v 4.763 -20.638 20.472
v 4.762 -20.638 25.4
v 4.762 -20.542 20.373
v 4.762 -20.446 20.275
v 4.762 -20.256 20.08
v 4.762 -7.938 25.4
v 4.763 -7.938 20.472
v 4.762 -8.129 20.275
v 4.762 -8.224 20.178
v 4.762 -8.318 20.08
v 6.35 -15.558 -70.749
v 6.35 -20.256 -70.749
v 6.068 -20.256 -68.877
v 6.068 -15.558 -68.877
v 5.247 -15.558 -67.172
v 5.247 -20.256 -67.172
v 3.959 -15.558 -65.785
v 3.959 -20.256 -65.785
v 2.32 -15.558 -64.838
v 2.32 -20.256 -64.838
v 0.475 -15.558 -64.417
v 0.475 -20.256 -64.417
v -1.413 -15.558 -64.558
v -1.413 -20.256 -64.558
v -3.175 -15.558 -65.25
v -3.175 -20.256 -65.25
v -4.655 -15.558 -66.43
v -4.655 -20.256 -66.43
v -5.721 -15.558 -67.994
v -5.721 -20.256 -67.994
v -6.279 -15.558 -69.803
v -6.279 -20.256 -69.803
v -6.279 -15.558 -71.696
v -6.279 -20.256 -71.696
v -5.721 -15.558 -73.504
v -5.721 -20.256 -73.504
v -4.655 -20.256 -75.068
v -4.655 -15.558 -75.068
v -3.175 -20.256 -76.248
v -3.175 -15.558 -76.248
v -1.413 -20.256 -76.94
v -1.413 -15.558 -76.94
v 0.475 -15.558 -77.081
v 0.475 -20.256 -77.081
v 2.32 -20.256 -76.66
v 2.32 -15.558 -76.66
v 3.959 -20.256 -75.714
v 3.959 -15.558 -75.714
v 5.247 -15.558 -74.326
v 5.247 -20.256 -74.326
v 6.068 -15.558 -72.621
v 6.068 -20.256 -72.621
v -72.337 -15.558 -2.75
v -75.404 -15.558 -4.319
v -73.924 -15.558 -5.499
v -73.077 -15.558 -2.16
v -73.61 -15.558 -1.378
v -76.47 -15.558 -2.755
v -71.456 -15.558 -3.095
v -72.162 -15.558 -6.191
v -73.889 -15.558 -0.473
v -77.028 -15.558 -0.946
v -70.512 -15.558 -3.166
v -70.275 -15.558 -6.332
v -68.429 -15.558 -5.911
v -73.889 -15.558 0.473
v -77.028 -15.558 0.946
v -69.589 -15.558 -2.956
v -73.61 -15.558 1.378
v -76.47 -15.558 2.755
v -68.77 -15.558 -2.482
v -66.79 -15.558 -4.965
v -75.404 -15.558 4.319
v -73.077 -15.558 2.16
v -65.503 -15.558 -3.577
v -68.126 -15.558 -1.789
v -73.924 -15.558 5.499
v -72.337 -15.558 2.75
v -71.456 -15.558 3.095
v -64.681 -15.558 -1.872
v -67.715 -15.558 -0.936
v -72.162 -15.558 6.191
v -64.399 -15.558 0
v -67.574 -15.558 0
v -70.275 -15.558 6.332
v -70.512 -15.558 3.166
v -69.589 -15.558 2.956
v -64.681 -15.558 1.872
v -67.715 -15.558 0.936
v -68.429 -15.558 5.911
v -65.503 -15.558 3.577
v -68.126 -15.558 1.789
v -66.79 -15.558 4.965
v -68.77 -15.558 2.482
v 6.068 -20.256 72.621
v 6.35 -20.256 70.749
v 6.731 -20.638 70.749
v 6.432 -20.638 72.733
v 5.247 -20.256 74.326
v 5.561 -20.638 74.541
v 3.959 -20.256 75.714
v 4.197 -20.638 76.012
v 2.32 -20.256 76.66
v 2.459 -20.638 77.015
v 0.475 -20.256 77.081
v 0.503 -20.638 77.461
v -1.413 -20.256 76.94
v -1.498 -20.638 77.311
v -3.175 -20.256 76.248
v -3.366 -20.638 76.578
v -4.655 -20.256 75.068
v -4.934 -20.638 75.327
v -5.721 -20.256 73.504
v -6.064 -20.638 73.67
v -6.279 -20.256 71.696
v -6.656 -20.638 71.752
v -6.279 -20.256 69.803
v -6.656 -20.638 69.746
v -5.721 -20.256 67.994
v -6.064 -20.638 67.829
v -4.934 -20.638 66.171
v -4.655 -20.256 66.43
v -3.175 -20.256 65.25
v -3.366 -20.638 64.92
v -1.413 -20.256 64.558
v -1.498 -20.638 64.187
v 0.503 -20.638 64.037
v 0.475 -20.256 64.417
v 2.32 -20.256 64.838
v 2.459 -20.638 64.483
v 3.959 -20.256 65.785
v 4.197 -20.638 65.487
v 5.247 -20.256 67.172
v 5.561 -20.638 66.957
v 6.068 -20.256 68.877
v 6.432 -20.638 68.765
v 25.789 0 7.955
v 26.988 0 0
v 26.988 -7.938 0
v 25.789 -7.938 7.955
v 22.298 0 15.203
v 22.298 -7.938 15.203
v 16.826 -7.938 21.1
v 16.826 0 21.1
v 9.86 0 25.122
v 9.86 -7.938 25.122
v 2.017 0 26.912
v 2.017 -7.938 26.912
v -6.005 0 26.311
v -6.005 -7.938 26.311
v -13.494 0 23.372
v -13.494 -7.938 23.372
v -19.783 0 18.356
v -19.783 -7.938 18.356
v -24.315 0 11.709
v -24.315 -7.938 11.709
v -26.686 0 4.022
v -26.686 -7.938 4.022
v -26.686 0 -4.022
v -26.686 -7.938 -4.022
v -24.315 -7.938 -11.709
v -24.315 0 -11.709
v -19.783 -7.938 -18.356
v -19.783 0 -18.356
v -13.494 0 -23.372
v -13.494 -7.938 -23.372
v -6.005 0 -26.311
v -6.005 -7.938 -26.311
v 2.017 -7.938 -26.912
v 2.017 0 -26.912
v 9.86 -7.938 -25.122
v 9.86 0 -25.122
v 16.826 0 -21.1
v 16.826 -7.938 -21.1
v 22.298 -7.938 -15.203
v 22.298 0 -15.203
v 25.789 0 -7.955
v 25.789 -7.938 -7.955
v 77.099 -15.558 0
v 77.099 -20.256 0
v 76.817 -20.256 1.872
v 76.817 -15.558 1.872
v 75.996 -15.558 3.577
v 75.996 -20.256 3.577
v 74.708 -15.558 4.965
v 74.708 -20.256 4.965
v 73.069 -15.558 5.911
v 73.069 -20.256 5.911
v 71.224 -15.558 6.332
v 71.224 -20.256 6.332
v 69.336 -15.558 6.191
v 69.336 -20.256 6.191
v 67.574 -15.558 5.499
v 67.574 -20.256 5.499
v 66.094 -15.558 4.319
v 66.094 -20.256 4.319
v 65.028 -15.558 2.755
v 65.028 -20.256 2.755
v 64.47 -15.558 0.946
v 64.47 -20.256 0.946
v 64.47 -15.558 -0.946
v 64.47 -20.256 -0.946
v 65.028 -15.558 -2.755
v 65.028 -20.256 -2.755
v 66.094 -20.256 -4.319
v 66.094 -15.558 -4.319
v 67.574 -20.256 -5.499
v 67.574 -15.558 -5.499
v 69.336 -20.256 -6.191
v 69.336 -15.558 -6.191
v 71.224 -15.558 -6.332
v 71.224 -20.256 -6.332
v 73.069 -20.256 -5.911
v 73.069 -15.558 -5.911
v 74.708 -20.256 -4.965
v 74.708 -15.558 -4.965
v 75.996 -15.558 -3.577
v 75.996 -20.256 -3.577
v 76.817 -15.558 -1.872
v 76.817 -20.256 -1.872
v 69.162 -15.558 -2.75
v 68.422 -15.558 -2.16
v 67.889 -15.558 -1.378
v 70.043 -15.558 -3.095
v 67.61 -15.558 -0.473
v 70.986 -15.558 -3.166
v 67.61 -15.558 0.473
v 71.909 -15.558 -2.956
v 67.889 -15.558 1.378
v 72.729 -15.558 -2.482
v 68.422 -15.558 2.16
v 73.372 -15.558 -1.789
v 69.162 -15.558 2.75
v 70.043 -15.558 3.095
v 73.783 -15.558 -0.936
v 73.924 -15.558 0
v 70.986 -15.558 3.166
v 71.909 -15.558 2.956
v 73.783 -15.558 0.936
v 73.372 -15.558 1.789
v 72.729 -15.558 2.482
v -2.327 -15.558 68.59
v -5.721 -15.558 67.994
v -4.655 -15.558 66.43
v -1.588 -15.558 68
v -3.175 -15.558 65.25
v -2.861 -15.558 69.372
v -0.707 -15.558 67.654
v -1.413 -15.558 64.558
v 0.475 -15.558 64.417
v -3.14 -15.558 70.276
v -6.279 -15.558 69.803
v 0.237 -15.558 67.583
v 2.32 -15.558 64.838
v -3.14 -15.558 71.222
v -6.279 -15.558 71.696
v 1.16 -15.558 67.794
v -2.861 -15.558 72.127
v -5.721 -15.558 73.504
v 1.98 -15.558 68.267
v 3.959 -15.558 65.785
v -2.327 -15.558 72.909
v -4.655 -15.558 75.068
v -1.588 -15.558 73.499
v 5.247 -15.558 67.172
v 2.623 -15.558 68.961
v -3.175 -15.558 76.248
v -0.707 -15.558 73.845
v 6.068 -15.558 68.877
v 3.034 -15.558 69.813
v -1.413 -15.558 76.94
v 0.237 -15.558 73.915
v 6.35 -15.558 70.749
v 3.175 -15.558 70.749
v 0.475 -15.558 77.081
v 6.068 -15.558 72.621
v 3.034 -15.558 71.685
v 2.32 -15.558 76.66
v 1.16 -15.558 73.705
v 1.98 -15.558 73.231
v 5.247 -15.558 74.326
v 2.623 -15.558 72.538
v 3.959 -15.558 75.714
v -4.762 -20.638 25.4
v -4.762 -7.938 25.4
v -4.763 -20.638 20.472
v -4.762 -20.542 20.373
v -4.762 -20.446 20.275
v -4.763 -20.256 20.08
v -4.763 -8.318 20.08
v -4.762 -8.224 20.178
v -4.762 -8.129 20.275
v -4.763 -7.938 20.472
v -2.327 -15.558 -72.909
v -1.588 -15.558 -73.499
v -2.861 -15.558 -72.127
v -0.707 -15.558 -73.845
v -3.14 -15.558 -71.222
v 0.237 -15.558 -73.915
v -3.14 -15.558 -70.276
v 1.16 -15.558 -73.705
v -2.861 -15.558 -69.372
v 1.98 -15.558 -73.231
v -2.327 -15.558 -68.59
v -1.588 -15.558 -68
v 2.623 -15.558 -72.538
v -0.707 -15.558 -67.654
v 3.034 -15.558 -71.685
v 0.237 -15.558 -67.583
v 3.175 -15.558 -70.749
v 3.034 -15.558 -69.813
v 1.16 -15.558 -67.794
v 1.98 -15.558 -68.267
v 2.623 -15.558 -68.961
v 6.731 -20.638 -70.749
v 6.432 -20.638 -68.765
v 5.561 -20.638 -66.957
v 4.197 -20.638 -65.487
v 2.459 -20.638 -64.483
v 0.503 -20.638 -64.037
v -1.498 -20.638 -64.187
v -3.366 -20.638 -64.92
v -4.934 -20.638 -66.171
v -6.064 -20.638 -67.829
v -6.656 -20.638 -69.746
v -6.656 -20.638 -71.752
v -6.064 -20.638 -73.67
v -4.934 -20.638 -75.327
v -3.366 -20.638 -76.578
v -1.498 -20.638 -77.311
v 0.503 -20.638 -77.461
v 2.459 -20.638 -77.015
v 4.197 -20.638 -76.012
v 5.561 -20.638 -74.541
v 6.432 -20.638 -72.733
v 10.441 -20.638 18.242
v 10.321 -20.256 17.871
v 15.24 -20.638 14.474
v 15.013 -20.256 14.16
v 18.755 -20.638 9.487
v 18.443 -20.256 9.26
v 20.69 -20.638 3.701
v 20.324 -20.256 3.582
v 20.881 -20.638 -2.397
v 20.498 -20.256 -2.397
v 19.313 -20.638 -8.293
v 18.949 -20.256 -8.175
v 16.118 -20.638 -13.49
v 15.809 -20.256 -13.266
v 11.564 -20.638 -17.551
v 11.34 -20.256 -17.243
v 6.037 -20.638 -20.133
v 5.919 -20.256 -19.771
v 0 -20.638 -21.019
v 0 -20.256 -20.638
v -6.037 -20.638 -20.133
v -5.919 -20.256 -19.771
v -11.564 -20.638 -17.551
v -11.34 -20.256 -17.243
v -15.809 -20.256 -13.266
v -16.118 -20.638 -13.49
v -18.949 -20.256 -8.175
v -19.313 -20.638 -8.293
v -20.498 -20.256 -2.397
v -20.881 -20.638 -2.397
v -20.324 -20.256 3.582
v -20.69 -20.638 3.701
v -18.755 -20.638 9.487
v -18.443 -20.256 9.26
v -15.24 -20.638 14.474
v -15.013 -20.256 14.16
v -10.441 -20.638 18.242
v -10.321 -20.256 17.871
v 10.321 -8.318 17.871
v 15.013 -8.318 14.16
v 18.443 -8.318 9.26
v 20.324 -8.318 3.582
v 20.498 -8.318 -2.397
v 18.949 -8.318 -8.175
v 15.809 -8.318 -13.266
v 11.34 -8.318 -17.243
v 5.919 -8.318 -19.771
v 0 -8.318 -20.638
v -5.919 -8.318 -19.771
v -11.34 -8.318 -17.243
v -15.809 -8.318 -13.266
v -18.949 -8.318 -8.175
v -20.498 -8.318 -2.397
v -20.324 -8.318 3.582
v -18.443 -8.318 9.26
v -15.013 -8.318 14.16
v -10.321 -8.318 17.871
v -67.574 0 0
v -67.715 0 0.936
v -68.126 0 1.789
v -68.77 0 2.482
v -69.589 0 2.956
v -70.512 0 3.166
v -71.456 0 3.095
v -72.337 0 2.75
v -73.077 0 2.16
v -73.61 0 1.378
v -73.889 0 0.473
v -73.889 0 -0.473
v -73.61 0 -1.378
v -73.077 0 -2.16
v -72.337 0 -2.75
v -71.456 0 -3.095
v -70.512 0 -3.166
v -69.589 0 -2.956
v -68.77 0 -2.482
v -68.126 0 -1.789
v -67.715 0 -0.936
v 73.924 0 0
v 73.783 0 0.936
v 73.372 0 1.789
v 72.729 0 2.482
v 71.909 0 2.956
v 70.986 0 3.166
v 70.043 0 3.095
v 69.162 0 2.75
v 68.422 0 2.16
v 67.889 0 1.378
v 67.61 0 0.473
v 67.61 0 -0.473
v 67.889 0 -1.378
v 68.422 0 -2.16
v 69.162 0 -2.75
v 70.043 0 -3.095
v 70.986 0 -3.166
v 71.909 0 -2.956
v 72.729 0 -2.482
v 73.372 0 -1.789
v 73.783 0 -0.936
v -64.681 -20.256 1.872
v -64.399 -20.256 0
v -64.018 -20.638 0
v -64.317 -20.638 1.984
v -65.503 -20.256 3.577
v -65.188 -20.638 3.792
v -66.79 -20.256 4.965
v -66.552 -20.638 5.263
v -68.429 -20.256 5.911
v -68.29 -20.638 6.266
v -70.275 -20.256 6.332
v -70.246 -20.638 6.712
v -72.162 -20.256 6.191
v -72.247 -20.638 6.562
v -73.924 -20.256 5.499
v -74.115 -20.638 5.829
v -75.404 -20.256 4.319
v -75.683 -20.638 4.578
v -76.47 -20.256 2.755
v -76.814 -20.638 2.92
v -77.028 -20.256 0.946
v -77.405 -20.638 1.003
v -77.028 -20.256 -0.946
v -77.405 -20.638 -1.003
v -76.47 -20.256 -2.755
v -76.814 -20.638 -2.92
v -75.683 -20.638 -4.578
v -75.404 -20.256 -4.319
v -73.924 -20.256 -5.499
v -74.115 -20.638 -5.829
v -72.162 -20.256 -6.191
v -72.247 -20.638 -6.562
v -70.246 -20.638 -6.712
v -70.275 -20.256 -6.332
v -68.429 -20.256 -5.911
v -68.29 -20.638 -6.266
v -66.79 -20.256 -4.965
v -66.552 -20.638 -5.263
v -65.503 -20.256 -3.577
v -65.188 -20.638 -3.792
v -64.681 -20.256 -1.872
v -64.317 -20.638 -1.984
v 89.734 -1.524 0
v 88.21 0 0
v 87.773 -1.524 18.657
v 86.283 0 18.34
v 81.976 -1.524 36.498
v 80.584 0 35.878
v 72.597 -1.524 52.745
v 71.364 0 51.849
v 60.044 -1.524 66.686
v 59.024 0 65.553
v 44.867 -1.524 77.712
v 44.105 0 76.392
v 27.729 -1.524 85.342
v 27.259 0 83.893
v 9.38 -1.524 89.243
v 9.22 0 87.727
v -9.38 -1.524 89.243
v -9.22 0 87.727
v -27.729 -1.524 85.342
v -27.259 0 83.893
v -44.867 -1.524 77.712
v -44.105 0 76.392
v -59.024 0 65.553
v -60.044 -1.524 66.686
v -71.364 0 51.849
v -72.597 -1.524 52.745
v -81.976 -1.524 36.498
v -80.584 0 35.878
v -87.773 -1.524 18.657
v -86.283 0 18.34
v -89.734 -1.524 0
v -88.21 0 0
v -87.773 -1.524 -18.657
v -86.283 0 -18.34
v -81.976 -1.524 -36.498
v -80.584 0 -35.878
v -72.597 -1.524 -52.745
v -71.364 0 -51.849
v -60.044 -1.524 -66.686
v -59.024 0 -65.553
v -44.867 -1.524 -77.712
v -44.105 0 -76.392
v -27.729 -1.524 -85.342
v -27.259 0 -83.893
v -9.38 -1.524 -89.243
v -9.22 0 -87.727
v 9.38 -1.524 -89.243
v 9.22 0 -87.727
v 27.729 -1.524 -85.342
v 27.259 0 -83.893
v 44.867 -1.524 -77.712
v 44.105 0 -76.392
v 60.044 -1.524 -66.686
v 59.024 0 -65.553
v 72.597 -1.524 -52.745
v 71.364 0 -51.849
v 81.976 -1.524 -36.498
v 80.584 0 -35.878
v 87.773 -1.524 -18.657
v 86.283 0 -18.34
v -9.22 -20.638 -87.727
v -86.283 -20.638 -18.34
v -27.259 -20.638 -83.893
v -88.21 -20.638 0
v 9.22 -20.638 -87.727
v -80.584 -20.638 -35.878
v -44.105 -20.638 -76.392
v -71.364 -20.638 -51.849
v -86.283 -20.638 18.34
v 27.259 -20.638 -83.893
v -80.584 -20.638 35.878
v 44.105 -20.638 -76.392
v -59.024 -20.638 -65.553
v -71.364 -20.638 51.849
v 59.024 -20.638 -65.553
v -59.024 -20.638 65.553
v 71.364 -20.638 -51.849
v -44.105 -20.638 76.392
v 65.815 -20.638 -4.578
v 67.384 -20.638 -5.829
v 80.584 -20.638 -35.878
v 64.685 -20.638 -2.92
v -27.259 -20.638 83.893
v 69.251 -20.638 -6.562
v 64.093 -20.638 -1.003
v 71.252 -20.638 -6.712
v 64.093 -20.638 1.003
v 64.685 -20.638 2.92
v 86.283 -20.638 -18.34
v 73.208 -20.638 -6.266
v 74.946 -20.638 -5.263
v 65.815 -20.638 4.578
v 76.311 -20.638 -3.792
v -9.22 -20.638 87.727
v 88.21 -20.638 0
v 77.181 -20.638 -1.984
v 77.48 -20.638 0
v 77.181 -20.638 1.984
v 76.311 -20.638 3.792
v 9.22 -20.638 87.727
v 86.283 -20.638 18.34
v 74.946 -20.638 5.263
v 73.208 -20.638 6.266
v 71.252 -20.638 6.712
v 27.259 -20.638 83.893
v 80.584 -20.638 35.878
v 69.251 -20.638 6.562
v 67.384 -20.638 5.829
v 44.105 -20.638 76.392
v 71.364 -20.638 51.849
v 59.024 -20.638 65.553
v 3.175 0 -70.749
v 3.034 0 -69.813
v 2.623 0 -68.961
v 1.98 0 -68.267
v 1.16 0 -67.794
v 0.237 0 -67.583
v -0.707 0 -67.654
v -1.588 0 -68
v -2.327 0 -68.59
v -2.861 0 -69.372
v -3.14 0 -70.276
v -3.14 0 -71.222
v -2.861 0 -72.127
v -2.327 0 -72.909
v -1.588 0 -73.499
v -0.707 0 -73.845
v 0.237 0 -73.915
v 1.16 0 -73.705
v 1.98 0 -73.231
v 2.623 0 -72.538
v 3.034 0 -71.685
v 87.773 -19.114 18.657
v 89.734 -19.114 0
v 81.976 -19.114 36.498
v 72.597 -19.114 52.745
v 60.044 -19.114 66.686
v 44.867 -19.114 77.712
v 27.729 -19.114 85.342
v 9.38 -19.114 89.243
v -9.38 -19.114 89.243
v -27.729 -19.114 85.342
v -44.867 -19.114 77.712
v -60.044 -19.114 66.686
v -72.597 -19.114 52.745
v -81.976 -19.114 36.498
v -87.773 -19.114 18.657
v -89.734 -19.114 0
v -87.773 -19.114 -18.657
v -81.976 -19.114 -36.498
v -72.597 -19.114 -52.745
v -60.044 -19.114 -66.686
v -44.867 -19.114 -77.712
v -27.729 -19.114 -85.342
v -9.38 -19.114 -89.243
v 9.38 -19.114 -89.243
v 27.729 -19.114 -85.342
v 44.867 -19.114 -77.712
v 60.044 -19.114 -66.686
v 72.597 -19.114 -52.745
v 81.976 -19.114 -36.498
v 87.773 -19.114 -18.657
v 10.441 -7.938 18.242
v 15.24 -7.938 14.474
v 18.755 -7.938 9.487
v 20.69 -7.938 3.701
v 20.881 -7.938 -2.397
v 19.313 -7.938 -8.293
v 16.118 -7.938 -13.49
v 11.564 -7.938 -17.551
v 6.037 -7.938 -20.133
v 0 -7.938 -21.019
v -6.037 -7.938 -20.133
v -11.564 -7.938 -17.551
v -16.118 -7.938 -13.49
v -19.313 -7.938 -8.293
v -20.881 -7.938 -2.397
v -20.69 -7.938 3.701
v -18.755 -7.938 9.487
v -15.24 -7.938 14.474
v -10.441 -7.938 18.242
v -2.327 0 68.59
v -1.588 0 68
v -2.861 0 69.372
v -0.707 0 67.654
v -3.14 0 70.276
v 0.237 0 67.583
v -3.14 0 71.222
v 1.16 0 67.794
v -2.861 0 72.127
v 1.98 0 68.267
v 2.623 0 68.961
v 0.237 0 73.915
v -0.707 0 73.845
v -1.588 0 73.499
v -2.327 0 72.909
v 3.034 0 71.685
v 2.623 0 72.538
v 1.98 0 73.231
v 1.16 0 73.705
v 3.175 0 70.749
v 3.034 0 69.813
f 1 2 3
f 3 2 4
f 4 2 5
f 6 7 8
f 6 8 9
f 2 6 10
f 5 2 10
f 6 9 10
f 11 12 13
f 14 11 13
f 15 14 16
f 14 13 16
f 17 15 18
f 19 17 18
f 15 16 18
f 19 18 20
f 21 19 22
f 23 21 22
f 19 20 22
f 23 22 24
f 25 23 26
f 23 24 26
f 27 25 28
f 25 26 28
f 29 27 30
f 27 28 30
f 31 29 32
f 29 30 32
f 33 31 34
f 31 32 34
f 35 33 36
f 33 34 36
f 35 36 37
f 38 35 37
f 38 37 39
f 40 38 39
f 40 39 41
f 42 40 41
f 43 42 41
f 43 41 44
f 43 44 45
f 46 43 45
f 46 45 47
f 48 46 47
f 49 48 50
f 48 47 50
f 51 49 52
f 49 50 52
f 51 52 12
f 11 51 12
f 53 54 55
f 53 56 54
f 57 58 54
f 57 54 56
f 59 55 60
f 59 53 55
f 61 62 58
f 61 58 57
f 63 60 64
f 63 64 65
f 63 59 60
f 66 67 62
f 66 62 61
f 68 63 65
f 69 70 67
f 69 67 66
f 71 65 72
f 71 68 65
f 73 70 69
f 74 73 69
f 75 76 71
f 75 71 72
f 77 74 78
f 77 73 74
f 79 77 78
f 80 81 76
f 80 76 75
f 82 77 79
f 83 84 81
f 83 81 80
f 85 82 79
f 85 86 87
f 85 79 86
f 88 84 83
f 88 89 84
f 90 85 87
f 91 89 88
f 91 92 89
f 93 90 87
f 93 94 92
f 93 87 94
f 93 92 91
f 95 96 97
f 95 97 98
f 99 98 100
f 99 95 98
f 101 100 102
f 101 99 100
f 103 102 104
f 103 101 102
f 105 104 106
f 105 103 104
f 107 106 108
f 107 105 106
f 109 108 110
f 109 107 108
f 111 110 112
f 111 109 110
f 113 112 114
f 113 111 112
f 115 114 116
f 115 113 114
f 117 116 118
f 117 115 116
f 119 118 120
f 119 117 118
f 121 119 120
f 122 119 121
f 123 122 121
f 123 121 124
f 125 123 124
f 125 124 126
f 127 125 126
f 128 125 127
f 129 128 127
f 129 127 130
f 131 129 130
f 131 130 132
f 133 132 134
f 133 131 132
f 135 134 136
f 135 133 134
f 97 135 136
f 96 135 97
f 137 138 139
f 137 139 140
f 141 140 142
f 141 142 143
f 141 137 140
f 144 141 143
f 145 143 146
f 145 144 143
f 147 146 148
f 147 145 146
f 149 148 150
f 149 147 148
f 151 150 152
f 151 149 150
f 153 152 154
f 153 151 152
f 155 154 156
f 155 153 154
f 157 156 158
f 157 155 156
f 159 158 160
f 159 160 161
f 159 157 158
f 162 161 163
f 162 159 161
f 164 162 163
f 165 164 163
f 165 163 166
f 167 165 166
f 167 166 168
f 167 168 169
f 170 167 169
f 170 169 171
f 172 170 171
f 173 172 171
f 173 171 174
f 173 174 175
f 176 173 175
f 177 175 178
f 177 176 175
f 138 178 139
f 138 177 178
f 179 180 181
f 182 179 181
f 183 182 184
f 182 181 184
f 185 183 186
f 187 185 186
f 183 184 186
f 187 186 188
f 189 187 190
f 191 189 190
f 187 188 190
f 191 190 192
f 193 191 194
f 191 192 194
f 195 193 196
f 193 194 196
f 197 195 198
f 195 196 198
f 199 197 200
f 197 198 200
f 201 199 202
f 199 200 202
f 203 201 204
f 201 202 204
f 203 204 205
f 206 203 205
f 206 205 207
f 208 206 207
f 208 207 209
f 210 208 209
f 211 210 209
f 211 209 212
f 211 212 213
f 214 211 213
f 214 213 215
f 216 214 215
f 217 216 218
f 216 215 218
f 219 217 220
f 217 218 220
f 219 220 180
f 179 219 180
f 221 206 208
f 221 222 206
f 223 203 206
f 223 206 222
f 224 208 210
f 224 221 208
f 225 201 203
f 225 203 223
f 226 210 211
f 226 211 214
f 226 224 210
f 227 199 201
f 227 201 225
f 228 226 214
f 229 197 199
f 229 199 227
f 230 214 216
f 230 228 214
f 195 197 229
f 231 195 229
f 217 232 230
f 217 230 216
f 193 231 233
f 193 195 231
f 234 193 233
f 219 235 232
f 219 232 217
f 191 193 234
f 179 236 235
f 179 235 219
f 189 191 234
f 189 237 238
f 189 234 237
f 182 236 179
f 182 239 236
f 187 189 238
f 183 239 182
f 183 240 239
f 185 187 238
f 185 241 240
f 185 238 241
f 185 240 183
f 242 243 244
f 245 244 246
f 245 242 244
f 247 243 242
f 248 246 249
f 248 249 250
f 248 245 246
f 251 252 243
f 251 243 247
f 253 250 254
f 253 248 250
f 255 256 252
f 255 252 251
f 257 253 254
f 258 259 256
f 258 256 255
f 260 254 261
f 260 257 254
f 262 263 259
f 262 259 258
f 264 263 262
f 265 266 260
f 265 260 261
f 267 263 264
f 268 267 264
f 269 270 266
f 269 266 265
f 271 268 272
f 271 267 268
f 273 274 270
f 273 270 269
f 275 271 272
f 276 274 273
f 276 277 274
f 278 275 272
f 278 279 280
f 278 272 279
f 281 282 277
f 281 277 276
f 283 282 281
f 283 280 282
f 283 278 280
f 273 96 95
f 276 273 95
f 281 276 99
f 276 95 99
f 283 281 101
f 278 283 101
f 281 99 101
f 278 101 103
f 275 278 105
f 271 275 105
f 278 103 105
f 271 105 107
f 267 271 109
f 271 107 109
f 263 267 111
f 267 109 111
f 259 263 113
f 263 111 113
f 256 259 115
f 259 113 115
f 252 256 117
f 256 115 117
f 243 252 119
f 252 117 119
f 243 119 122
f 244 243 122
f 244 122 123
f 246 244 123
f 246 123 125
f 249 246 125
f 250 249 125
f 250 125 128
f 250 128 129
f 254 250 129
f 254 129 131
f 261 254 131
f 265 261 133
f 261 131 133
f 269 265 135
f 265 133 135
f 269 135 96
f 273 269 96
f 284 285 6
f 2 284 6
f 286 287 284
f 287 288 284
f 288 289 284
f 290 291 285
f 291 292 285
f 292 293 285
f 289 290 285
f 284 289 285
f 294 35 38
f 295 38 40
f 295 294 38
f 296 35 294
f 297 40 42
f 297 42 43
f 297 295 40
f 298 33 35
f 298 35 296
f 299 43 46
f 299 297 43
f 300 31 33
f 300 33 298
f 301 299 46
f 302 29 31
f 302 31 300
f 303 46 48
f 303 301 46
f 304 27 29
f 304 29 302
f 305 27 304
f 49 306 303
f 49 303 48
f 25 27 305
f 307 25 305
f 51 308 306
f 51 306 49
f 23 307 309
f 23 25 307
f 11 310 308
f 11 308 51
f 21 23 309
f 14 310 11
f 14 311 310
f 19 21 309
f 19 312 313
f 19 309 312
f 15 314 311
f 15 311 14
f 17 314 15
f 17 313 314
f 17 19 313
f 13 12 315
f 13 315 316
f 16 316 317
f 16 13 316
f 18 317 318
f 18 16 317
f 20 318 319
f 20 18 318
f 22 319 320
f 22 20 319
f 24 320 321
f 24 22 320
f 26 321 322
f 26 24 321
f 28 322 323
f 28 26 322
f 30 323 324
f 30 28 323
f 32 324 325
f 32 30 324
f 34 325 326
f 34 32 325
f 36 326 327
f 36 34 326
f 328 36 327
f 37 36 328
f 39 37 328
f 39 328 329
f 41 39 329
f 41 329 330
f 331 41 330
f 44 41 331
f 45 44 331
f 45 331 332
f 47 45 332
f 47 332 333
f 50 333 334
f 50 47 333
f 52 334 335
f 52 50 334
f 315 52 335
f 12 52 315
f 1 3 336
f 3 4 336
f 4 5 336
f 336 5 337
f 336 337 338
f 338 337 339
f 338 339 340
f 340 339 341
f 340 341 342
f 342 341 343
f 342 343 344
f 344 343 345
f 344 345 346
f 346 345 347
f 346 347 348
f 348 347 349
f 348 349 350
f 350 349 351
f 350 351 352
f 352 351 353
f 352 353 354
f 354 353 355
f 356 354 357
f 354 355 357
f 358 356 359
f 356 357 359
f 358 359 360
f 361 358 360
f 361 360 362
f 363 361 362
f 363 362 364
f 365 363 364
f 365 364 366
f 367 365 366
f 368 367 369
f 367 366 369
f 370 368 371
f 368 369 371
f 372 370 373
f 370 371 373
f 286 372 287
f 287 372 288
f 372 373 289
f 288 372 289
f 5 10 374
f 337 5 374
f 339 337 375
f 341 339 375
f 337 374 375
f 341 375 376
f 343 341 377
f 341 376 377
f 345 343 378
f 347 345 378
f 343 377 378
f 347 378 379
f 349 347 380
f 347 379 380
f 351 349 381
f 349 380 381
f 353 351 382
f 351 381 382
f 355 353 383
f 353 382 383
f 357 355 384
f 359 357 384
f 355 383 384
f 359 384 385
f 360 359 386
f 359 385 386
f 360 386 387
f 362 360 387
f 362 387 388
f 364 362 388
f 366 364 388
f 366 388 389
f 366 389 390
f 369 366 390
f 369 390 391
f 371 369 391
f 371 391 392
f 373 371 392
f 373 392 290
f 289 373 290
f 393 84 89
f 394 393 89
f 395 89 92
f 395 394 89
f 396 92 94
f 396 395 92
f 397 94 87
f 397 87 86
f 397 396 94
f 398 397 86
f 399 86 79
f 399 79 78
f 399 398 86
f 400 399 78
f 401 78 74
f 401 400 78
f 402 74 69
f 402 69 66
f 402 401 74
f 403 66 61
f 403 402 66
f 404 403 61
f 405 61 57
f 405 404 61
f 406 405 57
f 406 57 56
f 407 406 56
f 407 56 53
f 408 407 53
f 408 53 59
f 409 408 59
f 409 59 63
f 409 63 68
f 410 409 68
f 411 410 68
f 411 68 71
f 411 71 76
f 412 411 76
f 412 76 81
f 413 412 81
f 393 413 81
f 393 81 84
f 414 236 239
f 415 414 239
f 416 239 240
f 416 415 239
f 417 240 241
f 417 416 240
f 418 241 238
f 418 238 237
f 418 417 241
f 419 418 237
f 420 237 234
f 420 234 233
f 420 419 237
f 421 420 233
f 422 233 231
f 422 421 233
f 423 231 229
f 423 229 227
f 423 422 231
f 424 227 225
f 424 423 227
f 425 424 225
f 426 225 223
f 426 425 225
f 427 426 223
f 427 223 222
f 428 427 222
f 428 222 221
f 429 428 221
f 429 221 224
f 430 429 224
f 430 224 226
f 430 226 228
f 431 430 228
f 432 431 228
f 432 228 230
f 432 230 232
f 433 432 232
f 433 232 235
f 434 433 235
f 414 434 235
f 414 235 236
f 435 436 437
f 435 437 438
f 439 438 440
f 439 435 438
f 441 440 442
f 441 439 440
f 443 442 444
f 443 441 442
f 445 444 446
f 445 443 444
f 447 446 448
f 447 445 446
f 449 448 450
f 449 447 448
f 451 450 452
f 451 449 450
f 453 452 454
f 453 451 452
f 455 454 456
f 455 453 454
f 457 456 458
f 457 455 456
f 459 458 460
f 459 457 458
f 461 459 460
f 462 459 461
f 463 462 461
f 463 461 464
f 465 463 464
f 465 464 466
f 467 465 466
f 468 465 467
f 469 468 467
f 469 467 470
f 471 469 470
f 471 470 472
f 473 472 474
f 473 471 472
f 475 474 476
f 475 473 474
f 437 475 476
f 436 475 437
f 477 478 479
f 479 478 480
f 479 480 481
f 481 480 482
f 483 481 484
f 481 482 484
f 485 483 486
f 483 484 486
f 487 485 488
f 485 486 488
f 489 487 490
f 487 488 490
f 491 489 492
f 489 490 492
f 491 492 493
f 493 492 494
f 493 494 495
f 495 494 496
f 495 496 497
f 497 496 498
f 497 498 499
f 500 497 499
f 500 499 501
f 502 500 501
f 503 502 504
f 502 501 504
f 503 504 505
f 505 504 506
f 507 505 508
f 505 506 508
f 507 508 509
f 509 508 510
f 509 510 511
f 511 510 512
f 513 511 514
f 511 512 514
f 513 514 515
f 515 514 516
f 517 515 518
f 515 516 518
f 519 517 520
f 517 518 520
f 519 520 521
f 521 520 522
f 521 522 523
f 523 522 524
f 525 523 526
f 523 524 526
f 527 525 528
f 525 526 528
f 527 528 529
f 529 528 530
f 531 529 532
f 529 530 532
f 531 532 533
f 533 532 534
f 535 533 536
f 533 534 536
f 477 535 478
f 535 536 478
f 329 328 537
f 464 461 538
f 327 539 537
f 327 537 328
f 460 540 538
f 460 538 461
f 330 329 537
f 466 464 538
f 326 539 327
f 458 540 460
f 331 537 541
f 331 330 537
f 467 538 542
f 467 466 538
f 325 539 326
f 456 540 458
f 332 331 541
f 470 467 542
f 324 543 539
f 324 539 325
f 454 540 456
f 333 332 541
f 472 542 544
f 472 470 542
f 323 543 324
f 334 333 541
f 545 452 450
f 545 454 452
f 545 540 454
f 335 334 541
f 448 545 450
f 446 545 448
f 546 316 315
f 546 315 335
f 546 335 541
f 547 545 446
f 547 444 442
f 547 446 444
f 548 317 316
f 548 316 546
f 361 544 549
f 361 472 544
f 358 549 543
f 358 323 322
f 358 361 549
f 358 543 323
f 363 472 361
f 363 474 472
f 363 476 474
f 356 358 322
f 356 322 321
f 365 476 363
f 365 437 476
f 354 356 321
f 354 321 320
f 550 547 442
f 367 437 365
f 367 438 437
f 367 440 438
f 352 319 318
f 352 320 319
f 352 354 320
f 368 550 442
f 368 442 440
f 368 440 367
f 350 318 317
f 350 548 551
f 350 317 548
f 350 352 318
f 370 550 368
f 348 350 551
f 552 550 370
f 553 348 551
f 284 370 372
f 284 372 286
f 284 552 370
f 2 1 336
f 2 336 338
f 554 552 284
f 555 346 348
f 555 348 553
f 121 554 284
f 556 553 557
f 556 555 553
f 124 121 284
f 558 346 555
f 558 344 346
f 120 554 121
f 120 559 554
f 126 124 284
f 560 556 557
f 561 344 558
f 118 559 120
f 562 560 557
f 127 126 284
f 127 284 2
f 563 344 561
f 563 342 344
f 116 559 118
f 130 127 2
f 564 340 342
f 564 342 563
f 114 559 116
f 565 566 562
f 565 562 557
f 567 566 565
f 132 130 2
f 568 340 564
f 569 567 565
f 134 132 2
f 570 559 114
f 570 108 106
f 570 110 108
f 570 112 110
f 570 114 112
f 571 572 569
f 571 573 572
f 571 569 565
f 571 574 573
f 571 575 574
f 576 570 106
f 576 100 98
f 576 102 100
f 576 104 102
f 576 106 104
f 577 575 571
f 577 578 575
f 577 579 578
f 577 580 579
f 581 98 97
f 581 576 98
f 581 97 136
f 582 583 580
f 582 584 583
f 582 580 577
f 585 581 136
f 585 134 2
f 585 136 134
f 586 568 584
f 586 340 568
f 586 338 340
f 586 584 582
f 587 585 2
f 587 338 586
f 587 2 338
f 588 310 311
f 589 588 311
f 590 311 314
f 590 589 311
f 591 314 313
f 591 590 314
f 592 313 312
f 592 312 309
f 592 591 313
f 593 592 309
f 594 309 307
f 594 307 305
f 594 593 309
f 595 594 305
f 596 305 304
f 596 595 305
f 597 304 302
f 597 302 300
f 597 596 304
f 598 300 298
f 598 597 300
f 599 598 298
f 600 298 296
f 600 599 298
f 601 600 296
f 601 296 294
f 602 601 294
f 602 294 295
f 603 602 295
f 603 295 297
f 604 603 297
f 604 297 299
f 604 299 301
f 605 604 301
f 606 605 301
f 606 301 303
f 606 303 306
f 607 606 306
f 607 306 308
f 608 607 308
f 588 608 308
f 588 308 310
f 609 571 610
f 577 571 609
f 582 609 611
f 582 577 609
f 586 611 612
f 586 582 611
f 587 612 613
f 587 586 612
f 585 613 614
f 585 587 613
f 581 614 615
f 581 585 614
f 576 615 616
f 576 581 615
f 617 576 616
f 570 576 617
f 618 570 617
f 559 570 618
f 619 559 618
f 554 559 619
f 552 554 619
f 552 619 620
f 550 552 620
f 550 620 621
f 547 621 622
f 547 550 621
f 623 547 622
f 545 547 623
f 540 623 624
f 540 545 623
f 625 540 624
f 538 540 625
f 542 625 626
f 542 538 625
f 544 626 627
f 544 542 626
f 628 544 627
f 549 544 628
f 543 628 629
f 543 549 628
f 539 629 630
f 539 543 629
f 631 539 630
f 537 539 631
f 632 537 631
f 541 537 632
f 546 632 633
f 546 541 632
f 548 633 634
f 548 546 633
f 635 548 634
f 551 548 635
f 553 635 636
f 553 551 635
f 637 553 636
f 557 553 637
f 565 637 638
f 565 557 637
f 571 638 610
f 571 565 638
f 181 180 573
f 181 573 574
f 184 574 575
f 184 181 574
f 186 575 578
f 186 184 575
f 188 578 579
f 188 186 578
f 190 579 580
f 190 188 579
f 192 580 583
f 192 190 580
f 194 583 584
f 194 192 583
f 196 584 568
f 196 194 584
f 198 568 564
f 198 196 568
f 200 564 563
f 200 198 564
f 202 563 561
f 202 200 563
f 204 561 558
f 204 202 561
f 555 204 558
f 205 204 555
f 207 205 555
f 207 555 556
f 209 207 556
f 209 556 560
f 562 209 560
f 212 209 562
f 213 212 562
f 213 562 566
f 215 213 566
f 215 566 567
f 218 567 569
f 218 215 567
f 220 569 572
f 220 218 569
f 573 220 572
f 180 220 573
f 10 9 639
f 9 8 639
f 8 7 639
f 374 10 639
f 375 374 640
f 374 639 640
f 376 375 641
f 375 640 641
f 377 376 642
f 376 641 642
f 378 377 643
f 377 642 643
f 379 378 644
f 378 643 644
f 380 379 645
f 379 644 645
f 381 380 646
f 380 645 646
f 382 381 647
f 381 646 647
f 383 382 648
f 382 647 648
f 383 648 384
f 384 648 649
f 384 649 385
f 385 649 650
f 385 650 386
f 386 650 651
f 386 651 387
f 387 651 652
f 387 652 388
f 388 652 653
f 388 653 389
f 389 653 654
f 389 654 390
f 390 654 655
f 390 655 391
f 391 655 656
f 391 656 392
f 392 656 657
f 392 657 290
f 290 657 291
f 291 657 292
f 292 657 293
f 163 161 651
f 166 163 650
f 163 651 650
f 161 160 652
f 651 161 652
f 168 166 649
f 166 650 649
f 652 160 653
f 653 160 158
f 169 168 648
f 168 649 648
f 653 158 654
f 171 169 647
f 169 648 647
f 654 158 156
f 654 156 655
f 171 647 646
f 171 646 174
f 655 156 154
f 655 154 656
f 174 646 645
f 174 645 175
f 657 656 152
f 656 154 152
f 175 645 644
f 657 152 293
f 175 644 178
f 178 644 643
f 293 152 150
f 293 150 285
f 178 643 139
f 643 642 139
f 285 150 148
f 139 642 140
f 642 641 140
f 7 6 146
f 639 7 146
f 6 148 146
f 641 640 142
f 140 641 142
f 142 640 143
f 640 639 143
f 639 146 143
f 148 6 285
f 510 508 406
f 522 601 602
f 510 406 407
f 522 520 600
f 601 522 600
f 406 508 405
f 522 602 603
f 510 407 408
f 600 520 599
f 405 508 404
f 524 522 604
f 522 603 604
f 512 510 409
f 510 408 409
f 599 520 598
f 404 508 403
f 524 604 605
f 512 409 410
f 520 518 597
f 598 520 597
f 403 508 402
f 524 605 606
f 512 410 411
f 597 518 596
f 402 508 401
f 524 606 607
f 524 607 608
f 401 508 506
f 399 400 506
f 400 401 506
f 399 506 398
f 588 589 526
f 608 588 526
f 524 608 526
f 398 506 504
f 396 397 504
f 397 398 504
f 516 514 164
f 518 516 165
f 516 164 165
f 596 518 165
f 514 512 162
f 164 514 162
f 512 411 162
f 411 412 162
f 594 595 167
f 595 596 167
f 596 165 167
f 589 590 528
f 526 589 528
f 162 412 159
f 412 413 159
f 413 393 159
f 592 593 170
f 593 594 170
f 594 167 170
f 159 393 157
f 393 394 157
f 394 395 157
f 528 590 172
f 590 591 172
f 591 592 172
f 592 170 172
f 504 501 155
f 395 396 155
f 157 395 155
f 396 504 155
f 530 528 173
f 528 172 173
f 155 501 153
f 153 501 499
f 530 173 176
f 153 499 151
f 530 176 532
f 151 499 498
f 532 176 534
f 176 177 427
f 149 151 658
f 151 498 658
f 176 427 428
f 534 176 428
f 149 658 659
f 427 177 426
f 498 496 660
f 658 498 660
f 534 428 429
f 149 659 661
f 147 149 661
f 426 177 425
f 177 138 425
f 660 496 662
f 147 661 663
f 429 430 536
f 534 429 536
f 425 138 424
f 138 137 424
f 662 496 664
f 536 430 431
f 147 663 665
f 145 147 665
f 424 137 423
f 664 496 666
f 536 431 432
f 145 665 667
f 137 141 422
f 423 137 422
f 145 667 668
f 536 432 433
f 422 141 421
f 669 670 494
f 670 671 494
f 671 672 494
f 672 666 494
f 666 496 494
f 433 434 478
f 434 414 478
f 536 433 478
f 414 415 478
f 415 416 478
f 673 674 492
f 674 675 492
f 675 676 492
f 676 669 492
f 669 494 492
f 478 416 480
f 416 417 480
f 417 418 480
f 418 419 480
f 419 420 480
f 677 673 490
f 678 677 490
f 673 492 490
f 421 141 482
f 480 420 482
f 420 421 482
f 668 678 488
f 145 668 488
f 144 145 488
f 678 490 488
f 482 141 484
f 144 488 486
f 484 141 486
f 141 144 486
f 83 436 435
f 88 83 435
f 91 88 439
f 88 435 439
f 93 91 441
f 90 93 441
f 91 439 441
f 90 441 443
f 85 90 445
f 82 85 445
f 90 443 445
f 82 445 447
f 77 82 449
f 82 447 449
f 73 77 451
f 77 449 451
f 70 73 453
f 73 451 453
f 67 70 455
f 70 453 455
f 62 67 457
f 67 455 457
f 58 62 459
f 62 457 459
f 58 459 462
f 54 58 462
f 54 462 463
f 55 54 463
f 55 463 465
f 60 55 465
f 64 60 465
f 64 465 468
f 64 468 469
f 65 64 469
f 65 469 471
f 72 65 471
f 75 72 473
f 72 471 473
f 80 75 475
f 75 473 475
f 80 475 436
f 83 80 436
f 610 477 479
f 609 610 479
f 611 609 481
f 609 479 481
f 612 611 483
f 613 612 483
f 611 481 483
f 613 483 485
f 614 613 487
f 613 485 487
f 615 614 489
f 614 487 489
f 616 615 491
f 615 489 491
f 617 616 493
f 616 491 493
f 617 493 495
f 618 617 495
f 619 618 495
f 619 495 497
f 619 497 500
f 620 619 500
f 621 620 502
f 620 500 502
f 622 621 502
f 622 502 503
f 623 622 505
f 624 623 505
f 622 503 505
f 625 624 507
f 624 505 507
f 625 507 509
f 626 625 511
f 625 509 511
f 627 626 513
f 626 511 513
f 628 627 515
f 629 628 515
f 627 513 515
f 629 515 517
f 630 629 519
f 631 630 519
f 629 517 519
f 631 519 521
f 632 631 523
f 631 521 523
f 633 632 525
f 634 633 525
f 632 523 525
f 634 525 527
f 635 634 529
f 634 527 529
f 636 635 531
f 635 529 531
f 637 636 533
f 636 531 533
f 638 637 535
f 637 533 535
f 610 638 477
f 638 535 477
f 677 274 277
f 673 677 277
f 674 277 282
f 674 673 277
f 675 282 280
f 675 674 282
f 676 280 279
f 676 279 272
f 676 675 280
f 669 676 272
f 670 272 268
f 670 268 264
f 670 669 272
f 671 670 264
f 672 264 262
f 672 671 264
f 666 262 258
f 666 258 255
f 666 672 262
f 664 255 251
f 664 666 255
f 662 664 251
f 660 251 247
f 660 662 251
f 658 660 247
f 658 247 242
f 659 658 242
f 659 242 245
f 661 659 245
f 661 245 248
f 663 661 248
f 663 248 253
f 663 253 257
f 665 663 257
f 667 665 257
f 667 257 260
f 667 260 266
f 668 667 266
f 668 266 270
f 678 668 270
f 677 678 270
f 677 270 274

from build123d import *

# Parameters (mm, degrees)
F0_R     = 89.73439
F0_R_2   = 3.175
F0_R_3   = 26.9875
F1_DEPTH = 20.6375
F2_DEPTH = 7.9375
F3_R     = 6.35
F3_R_2   = 3.175
F4_DEPTH = 5.08
F5_SIZE  = 1.524
F6_SIZE  = 0.381


with BuildPart() as f1:
    # F0 (on Front) → F1 (new body)
    with BuildSketch(Plane.XZ):
        Circle(F0_R)
        with Locations((0, -70.74916)):
            Circle(F0_R_2, mode=Mode.SUBTRACT)
        with Locations((-70.74916, 0)):
            Circle(F0_R_2, mode=Mode.SUBTRACT)
        Circle(F0_R_3, mode=Mode.SUBTRACT)
        with Locations((70.74916, 0)):
            Circle(F0_R_2, mode=Mode.SUBTRACT)
        with Locations((0, 70.74916)):
            Circle(F0_R_2, mode=Mode.SUBTRACT)
        Circle(F0_R_3)
        with BuildLine():
            ThreePointArc((4.7625, 20.080463), (0, -20.6375), (-4.7625, 20.080463))
            Line((-4.7625, 20.080463), (-4.7625, 25.4))
            Line((-4.7625, 25.4), (4.7625, 25.4))
            Line((4.7625, 25.4), (4.7625, 20.080463))
        make_face(mode=Mode.SUBTRACT)
    extrude(amount=F1_DEPTH)

    # F0 (on Front) → F2 (cut)
    with BuildSketch(Plane.XZ):
        Circle(F0_R_3)
        with BuildLine():
            ThreePointArc((4.7625, 20.080463), (0, -20.6375), (-4.7625, 20.080463))
            Line((-4.7625, 20.080463), (-4.7625, 25.4))
            Line((-4.7625, 25.4), (4.7625, 25.4))
            Line((4.7625, 25.4), (4.7625, 20.080463))
        make_face(mode=Mode.SUBTRACT)
    extrude(amount=F2_DEPTH, mode=Mode.SUBTRACT)

    # F3 (on face) → F4 (cut)
    with BuildSketch(Plane.XZ.offset(20.6375)):
        with Locations((0, 70.74916)):
            Circle(F3_R)
        with Locations((0, 70.74916)):
            Circle(F3_R_2, mode=Mode.SUBTRACT)
        with Locations((-70.74916, 0)):
            Circle(F3_R)
        with Locations((-70.74916, 0)):
            Circle(F3_R_2, mode=Mode.SUBTRACT)
        with Locations((0, -70.74916)):
            Circle(F3_R)
        with Locations((0, -70.74916)):
            Circle(F3_R_2, mode=Mode.SUBTRACT)
        with Locations((70.74916, 0)):
            Circle(F3_R)
        with Locations((70.74916, 0)):
            Circle(F3_R_2, mode=Mode.SUBTRACT)
    extrude(amount=-F4_DEPTH, mode=Mode.SUBTRACT)

    # F5
    f5_edges = [f1.edges().sort_by_distance(p)[0] for p in [
        (89.73439, -10.31875, 0),
        (-89.73439, 0, 0),
        (-89.73439, -20.6375, 0),
    ]]
    chamfer(f5_edges, length=F5_SIZE)

    # F6
    f6_edges = [f1.edges().sort_by_distance(p)[0] for p in [
        (0, -20.6375, -20.6375),
        (-77.09916, -20.6375, 0),
        (-6.35, -20.6375, 70.74916),
        (64.39916, -20.6375, 0),
        (-6.35, -20.6375, -70.74916),
        (0, -7.9375, -20.6375),
    ]]
    chamfer(f6_edges, length=F6_SIZE)


solid = f1.part
